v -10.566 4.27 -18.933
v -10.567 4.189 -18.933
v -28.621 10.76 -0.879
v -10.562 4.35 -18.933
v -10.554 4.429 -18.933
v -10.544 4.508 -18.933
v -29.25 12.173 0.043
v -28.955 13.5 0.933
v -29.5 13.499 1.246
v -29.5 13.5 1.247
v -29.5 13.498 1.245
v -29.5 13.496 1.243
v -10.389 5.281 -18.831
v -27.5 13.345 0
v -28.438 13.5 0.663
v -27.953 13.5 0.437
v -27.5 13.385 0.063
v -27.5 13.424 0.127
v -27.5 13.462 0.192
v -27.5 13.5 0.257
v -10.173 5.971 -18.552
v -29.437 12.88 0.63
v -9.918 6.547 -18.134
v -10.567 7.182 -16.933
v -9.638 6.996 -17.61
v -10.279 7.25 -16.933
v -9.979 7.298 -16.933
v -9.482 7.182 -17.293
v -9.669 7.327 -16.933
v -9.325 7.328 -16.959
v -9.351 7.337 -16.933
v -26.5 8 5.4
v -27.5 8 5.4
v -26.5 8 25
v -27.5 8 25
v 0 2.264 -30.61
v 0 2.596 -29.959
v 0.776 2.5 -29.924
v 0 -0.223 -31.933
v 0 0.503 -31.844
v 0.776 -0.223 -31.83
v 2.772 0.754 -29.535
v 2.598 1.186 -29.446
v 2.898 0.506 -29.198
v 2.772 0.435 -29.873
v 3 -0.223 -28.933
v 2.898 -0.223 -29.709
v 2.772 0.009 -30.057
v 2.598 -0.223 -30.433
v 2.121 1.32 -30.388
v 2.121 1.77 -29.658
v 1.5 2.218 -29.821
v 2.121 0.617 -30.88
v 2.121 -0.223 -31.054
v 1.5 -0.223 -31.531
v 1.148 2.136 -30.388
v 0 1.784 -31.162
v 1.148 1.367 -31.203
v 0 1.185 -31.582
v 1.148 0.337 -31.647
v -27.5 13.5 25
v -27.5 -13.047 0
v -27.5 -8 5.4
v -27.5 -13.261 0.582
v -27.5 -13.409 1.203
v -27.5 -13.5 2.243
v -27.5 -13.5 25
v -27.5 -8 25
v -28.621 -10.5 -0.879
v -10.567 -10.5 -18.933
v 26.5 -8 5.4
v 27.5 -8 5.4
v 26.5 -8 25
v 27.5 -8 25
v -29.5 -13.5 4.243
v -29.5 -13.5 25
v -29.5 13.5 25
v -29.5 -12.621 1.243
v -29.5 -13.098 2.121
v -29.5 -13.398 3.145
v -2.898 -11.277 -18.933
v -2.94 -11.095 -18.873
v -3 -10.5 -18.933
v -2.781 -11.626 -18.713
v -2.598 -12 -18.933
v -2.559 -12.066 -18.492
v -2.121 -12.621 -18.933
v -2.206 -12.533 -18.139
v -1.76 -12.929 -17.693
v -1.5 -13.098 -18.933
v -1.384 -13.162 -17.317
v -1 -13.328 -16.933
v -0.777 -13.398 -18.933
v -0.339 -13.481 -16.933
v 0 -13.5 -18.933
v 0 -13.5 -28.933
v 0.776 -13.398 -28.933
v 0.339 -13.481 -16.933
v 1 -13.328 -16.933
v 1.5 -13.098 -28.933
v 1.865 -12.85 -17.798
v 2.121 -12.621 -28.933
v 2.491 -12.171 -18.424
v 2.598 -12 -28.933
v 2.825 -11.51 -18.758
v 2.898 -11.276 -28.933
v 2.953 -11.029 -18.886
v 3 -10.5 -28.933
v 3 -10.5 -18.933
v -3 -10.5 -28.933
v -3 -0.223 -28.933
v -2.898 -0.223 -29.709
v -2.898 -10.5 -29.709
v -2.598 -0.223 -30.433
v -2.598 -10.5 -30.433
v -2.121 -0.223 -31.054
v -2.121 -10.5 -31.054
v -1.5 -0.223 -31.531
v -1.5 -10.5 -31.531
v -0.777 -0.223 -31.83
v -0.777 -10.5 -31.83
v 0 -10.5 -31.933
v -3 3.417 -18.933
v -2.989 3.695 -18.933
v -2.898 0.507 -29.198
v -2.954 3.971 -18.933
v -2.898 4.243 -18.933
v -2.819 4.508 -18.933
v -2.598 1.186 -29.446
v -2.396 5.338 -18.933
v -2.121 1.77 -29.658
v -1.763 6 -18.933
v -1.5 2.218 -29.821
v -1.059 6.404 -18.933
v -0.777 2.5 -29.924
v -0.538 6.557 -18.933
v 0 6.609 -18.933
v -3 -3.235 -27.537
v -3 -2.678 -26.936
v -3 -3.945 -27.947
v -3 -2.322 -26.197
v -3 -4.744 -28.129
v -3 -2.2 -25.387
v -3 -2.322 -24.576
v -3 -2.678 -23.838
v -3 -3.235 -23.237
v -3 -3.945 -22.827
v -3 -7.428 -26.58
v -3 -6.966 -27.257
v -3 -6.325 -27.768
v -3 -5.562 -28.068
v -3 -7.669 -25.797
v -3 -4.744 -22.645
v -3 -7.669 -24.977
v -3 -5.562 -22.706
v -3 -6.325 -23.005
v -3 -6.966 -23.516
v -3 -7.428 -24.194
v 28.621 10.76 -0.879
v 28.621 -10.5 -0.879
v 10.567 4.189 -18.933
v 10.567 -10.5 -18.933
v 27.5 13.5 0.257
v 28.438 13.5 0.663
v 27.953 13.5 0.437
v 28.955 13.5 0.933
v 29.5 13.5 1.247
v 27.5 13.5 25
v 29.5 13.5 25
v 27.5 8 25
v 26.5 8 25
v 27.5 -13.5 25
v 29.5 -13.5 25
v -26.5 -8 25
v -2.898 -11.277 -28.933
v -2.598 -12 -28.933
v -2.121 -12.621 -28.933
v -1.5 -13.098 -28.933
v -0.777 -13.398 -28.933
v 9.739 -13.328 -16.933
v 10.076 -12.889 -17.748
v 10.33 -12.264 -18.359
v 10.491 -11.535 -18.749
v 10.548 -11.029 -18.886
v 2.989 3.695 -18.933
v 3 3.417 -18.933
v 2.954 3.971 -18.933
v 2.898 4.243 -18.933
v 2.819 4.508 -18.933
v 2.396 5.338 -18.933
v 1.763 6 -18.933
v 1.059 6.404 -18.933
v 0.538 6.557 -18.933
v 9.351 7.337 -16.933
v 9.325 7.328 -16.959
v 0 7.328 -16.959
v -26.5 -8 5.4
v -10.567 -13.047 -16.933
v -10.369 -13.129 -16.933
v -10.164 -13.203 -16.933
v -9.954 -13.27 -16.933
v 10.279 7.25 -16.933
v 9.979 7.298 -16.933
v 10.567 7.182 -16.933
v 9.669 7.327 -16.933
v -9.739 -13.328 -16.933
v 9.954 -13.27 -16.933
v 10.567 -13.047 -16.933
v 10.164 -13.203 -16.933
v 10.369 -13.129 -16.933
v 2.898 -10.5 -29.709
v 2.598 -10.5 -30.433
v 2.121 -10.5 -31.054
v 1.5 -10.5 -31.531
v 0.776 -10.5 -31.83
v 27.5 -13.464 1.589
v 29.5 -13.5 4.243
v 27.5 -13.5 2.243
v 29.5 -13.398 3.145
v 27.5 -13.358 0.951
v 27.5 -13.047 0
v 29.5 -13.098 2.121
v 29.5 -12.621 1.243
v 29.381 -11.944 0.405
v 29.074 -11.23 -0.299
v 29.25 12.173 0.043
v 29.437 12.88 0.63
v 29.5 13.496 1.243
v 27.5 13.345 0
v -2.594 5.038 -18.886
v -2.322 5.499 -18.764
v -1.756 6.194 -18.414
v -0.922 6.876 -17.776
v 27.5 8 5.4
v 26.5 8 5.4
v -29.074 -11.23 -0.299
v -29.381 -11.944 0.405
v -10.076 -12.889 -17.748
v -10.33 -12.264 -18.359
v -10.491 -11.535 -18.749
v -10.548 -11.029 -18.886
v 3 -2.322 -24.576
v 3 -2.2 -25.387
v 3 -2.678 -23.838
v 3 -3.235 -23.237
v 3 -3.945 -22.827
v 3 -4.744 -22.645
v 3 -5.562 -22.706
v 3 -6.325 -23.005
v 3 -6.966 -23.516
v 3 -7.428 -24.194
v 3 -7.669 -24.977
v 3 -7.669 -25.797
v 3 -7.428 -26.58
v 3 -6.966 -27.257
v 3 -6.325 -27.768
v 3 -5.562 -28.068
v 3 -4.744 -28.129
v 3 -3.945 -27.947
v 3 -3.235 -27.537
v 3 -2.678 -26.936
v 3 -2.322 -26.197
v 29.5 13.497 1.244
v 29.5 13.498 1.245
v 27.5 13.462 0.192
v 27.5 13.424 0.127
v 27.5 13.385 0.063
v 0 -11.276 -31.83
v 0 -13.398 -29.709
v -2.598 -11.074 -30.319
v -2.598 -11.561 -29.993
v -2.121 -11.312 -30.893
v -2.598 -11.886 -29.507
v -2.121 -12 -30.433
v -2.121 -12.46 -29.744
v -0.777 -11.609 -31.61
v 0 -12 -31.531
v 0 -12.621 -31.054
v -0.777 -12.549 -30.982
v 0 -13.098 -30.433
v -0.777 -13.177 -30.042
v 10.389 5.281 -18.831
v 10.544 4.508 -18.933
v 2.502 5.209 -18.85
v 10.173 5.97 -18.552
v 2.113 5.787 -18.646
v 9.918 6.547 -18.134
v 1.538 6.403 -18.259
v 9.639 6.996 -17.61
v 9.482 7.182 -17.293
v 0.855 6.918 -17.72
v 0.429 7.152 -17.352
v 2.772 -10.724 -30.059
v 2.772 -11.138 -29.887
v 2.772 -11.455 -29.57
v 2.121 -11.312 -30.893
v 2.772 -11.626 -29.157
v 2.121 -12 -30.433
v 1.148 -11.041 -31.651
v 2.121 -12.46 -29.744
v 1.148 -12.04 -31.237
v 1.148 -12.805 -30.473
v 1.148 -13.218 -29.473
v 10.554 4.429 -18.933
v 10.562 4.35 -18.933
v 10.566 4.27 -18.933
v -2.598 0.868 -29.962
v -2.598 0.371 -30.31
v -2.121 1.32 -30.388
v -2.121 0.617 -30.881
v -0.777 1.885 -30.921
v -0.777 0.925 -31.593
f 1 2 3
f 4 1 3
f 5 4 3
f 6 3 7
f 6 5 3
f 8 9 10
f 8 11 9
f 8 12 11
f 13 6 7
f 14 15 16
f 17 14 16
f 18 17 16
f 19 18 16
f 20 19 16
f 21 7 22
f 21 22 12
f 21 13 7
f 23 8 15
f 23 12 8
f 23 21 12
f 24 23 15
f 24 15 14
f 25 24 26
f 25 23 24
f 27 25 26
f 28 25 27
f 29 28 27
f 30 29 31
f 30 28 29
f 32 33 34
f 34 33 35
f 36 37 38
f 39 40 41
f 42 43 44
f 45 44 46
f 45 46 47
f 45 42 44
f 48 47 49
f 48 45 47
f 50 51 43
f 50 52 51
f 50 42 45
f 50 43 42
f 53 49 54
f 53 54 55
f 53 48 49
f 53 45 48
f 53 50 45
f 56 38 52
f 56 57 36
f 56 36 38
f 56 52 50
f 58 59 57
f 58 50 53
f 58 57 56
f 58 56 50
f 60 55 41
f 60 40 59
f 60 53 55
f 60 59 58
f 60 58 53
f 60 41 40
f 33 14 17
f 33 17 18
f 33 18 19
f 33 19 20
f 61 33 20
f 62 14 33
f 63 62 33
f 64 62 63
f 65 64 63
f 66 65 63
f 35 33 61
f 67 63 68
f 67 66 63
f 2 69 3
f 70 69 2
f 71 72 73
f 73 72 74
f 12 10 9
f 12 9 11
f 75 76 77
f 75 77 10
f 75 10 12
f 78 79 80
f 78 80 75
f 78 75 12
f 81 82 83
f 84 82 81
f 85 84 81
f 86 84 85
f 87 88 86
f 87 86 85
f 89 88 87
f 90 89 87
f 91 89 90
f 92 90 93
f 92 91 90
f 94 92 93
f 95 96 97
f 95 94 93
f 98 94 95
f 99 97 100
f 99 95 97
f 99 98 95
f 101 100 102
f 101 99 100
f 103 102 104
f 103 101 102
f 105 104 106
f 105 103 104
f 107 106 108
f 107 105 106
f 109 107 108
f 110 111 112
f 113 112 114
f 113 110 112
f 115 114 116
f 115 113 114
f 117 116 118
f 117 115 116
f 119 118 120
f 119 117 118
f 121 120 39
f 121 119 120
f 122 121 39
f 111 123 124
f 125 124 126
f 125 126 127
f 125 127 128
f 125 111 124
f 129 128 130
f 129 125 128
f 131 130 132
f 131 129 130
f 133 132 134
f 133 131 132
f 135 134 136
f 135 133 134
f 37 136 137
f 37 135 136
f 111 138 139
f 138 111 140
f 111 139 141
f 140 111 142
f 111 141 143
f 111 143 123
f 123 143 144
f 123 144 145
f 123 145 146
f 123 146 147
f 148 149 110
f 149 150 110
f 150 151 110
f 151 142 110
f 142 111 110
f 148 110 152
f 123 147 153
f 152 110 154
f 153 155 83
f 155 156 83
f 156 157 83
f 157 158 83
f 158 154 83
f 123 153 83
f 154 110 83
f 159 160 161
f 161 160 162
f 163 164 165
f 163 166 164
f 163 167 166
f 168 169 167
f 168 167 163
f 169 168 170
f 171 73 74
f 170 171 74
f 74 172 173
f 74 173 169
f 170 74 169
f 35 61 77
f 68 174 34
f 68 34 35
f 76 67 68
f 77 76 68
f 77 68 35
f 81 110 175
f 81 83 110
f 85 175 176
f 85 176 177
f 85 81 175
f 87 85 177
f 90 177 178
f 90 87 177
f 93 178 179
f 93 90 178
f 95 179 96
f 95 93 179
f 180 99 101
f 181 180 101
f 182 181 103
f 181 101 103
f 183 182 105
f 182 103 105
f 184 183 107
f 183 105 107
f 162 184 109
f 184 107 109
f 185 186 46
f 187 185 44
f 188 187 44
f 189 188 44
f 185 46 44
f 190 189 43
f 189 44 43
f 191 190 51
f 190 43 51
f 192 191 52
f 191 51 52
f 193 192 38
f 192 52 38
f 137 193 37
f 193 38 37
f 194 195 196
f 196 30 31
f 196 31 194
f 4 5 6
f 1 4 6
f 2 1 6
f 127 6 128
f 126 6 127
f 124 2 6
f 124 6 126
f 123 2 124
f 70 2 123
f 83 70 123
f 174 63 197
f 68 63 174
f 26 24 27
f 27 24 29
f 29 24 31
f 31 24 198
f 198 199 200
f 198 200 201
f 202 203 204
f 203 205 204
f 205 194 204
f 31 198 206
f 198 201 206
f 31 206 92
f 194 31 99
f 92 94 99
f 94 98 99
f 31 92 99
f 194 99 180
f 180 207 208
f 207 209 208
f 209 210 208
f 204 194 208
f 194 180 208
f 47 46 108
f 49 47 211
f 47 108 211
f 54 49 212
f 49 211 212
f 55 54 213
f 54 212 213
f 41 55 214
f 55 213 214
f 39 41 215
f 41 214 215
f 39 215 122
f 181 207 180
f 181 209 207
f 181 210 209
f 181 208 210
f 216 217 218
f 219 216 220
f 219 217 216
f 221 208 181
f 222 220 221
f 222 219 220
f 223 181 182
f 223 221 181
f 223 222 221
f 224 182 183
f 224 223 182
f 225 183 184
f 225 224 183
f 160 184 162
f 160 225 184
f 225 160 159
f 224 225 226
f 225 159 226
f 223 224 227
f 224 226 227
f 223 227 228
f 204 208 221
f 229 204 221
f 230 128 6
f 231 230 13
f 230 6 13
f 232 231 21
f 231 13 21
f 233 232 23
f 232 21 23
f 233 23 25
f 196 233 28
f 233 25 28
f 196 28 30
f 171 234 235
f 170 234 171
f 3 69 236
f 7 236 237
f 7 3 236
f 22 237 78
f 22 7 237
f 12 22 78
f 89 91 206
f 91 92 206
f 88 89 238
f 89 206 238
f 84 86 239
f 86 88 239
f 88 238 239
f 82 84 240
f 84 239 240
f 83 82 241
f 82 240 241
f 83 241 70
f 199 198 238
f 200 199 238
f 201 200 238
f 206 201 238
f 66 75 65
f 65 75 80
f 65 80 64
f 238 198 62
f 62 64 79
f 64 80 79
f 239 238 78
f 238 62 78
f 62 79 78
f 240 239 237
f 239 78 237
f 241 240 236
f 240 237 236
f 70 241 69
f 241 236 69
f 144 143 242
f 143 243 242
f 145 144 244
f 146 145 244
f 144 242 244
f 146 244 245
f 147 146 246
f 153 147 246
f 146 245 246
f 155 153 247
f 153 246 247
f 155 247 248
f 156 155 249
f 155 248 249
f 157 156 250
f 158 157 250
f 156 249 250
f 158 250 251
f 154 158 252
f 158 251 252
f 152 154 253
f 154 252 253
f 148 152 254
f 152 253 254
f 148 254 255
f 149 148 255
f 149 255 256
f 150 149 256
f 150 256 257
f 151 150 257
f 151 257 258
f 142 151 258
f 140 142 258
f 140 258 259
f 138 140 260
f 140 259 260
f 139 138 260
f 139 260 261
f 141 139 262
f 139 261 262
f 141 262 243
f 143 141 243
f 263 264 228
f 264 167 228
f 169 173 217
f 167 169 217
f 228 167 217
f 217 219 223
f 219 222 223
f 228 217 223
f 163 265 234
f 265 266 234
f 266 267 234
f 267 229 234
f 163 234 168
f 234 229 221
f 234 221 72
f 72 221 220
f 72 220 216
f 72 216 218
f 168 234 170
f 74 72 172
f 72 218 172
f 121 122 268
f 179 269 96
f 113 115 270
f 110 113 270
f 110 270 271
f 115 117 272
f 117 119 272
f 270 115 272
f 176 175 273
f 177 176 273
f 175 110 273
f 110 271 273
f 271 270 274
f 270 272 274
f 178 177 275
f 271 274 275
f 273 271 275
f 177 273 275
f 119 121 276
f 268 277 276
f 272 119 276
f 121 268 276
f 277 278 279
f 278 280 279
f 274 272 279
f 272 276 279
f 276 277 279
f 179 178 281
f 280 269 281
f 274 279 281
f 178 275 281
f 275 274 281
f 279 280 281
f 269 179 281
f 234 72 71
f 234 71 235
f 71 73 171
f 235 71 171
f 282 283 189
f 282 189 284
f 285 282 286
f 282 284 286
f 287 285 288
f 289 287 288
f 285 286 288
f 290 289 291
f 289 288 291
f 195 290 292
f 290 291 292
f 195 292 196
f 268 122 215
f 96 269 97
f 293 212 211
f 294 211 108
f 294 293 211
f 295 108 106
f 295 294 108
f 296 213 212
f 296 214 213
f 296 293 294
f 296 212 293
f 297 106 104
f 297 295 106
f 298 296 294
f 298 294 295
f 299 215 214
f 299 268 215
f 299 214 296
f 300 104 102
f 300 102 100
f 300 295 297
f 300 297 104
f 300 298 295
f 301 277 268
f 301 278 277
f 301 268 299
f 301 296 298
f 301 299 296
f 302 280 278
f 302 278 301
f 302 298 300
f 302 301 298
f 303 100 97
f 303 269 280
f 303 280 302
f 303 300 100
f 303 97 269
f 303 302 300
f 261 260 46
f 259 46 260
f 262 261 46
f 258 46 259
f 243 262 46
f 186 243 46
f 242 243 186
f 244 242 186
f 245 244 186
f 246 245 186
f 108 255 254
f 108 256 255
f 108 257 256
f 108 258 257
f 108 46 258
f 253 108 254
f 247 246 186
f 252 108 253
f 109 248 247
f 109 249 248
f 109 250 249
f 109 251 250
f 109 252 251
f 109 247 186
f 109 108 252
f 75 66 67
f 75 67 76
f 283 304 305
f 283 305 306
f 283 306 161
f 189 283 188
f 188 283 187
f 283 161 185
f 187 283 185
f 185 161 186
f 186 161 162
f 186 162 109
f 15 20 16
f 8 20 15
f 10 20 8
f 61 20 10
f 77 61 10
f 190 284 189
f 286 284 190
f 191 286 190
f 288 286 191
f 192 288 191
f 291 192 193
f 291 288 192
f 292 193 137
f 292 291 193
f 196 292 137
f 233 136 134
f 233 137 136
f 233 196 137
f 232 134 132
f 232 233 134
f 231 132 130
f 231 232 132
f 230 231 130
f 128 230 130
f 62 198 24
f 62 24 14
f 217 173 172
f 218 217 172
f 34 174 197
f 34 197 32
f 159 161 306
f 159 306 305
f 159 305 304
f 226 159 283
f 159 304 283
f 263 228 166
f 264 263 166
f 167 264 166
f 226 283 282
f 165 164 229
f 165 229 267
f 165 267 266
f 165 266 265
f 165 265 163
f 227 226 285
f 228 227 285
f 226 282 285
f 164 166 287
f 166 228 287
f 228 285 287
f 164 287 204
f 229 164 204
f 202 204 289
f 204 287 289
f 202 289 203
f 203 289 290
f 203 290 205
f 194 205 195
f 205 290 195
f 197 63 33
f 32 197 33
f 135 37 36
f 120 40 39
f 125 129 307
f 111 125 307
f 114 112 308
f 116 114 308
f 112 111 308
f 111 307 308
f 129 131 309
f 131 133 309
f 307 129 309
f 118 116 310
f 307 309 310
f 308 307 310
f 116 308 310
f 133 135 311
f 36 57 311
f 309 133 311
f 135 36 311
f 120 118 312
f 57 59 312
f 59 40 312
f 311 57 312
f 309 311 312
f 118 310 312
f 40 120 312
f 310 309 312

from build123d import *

# Parameters (mm, degrees)
F0_W          = 3
F0_H          = 13
F1_DEPTH      = 13.5
F2_W          = 16
F2_H          = 19.6
F3_DEPTH      = 1
F6_DEPTH      = 5000
F7_R          = 2.75
F8_DEPTH      = 50
F9_F1_R       = 3
F9_F2_R       = 3
F9_F3_R       = 3
F9_F4_R       = 2.9999
F10_T1_DEPTH  = 15.0673355609
F10_T3_DEPTH  = 15.0673355609
F10_T5_DEPTH  = 41.7748308216
F10_T7_DEPTH  = 41.7748308216
F10_T9_DEPTH  = 43.4696886285
F10_T11_DEPTH = 12.8188920975
F10_T13_DEPTH = 12.8188920975
F10_T15_DEPTH = 43.4696886285
F10_T17_DEPTH = 33.2132034356
F10_T22_DEPTH = 8.2514565366
F10_S23_R     = 3
F10_T24_DEPTH = 6
F10_T28_DEPTH = 8.2515565366
F10_S29_R     = 3
F10_T30_DEPTH = 6
F10_T34_DEPTH = 10.4999
F10_S35_R     = 3
F10_T36_DEPTH = 7
F10_T40_DEPTH = 10.5
F10_S41_R     = 3
F10_T42_DEPTH = 7


# Not quite as in the source:
# - a fillet or chamfer that OpenCascade refuses, or shapes differently, is made with other operations: its cross-section is extruded or revolved along the edge and cut away or added
# - a fillet or chamfer is up to 0.001 mm smaller than in the source, because OpenCascade refuses the exact size
# - a feature names something its author has since deleted; it is built from what else it names


with BuildPart() as f1:
    # F0 (on Front) → F1 (new body, symmetric)
    with BuildSketch(Plane.XZ):
        with Locations((-1.5, -25.4326644391)):
            Rectangle(F0_W, F0_H)
        Polygon((-10.5673355609, -16.9326644391), (-27.5, 0), (-27.5, 3.3434056677), (-27.5, 25), (-29.5, 25), (-29.5, 0), (-10.5673355609, -18.9326644391), (-3, -18.9326644391), (0, -18.9326644391), (0, -16.9326644391), align=None)
    extrude(amount=F1_DEPTH, both=True)

    # F2 (on face) → F3 (join)
    with BuildSketch(Plane.YZ.offset(-27.5)):
        with Locations((0, 15.2)):
            Rectangle(F2_W, F2_H)
    extrude(amount=F3_DEPTH)

    # F4: F1 across plane


with BuildPart() as f1_1:
    add(f1.part)
    add(f1.part.mirror(Plane.YZ))

    # F5 (on face) → F6 (cut, symmetric)
    with BuildSketch(Plane(origin=(-29.5, 0, 0), x_dir=(0, -1, 0), z_dir=(-1, 0, 0))):
        Polygon((-13.5, 0), (-21.2256871164, 0), (-25.0640398382, -39.3923101205), (-6.5540728933, -39.3923101205), (0.180805733, -37.5877048314), align=None)
    extrude(amount=F6_DEPTH, both=True, mode=Mode.SUBTRACT)

    # F7 (on face) → F8 (cut, symmetric)
    with BuildSketch(Plane.YZ.offset(3)):
        with Locations((-4.9499999732, -25.3868680447)):
            Circle(F7_R)
    extrude(amount=F8_DEPTH, both=True, mode=Mode.SUBTRACT)

    # F9: fillet of radius 3 on 4 edges, made by hand

    # F9_f1
    f9_f1_edges = [f1_1.edges().sort_by_distance(p)[0] for p in [
        (0, 1.8774606434, -31.9326644391),
    ]]
    fillet(f9_f1_edges, radius=F9_F1_R)

    # F9_f2
    f9_f2_edges = [f1_1.edges().sort_by_distance(p)[0] for p in [
        (0, -13.5, -31.9326644391),
    ]]
    fillet(f9_f2_edges, radius=F9_F2_R)

    # F9_f3
    f9_f3_edges = [f1_1.edges().sort_by_distance(p)[0] for p in [
        (3, -5.3615809856, -31.9326644391),
    ]]
    fillet(f9_f3_edges, radius=F9_F3_R)

    # F9_f4 (radius 3 in the source; OpenCascade refuses exactly that, so slightly less here)
    f9_f4_edges = [f1_1.edges().sort_by_distance(p)[0] for p in [
        (-3, -5.3615809856, -31.9326644391),
    ]]
    fillet(f9_f4_edges, radius=F9_F4_R)

    # F10: fillet of radius 3 on 12 edges, made by hand

    # F10_s2 → F10_t1 (cut)
    with BuildSketch(Plane.YZ.offset(3)):
        with BuildLine():
            ThreePointArc((-13.5, -15.9326644391), (-12.6213203436, -18.0539847826), (-10.5, -18.9326644391))
            Line((-10.5, -18.9326644391), (-13.5, -18.9326644391))
            Line((-13.5, -18.9326644391), (-13.5, -15.9326644391))
        make_face()
    extrude(amount=F10_T1_DEPTH, mode=Mode.SUBTRACT)

    # F10_s4 → F10_t3 (cut)
    with BuildSketch(Plane.YZ.offset(-18.0673355609)):
        with BuildLine():
            ThreePointArc((-13.5, -15.9326644391), (-12.6213203436, -18.0539847826), (-10.5, -18.9326644391))
            Line((-10.5, -18.9326644391), (-13.5, -18.9326644391))
            Line((-13.5, -18.9326644391), (-13.5, -15.9326644391))
        make_face()
    extrude(amount=F10_T3_DEPTH, mode=Mode.SUBTRACT)

    # F10_s6 → F10_t5 (cut)
    with BuildSketch(Plane(origin=(-20.0533008589, 0, 20.0533008589), x_dir=(0, 1, 0), z_dir=(0.7071067812, 0, -0.7071067812))):
        with BuildLine():
            ThreePointArc((-13.5, -17.859650045), (-12.6213203436, -19.9809703886), (-10.5, -20.859650045))
            Line((-10.5, -20.859650045), (-13.5, -20.859650045))
            Line((-13.5, -20.859650045), (-13.5, -17.859650045))
        make_face()
    extrude(amount=F10_T5_DEPTH, mode=Mode.SUBTRACT)

    # F10_s8 → F10_t7 (cut)
    with BuildSketch(Plane(origin=(20.0533008589, 0, 20.0533008589), x_dir=(0, 1, 0), z_dir=(-0.7071067812, 0, -0.7071067812))):
        with BuildLine():
            ThreePointArc((-13.5, 17.859650045), (-12.6213203436, 19.9809703886), (-10.5, 20.859650045))
            Line((-10.5, 20.859650045), (-13.5, 20.859650045))
            Line((-13.5, 20.859650045), (-13.5, 17.859650045))
        make_face()
    extrude(amount=F10_T7_DEPTH, mode=Mode.SUBTRACT)

    # F10_s10 → F10_t9 (cut)
    with BuildSketch(Plane(origin=(-6.8077517267, -2.4778189908, -6.8077517267), x_dir=(-0.3420201433, 0.9396926208, 0), z_dir=(0.6847910788, 0.2492435694, 0.6847910788))):
        with BuildLine():
            ThreePointArc((0.3217904404, -21.5780178201), (2.267861443, -21.4075638122), (3.6963913931, -20.0750664959))
            Line((3.6963913931, -20.0750664959), (2.5962561525, -22.1449137726))
            Line((2.5962561525, -22.1449137726), (0.3217904404, -21.5780178201))
        make_face()
    extrude(amount=F10_T9_DEPTH, mode=Mode.SUBTRACT)

    # F10_s12 → F10_t11 (cut)
    with BuildSketch(Plane.YZ.offset(3)):
        with BuildLine():
            ThreePointArc((4.5084510742, -18.9326644391), (6.2291803832, -18.3901205719), (7.3275289366, -16.9587248691))
            Line((7.3275289366, -16.9587248691), (6.6090736888, -18.9326644391))
            Line((6.6090736888, -18.9326644391), (4.5084510742, -18.9326644391))
        make_face()
    extrude(amount=F10_T11_DEPTH, mode=Mode.SUBTRACT)

    # F10_s14 → F10_t13 (cut)
    with BuildSketch(Plane.YZ.offset(-15.8188920975)):
        with BuildLine():
            ThreePointArc((4.5084510742, -18.9326644391), (6.2291803832, -18.3901205719), (7.3275289366, -16.9587248691))
            Line((7.3275289366, -16.9587248691), (6.6090736888, -18.9326644391))
            Line((6.6090736888, -18.9326644391), (4.5084510742, -18.9326644391))
        make_face()
    extrude(amount=F10_T13_DEPTH, mode=Mode.SUBTRACT)

    # F10_s16 → F10_t15 (cut)
    with BuildSketch(Plane(origin=(6.8077517267, -2.4778189908, -6.8077517267), x_dir=(-0.3420201433, -0.9396926208, 0), z_dir=(-0.6847910788, 0.2492435694, 0.6847910788))):
        with BuildLine():
            ThreePointArc((-0.3217904404, -21.5780178201), (-2.267861443, -21.4075638122), (-3.6963913931, -20.0750664959))
            Line((-3.6963913931, -20.0750664959), (-2.5962561525, -22.1449137726))
            Line((-2.5962561525, -22.1449137726), (-0.3217904404, -21.5780178201))
        make_face()
    extrude(amount=F10_T15_DEPTH, mode=Mode.SUBTRACT)

    # F10_s18 → F10_t17 (cut)
    with BuildSketch(Plane.XZ.offset(-16.6066017178)):
        with BuildLine():
            ThreePointArc((28.6213203436, -0.8786796564), (29.2716385975, 0.09459039), (29.5, 1.2426406871))
            Line((29.5, 1.2426406871), (29.5, 0))
            Line((29.5, 0), (28.6213203436, -0.8786796564))
        make_face()
        with BuildLine():
            ThreePointArc((-28.6213203436, -0.8786796564), (-29.2716385975, 0.09459039), (-29.5, 1.2426406871))
            Line((-29.5, 1.2426406871), (-29.5, 0))
            Line((-29.5, 0), (-28.6213203436, -0.8786796564))
        make_face()
    extrude(amount=F10_T17_DEPTH, mode=Mode.SUBTRACT)


with BuildPart() as f10_tool20:
    # F10_s21 → F10_t22 (new body)
    with BuildSketch(Plane.YZ.offset(-3)):
        with BuildLine():
            ThreePointArc((4.5084510742, -18.9326644391), (6.2291803832, -18.3901205719), (7.3275289366, -16.9587248691))
            Line((7.3275289366, -16.9587248691), (6.6090736888, -18.9326644391))
            Line((6.6090736888, -18.9326644391), (4.5084510742, -18.9326644391))
        make_face()
    extrude(amount=F10_T22_DEPTH)

    # F10_s23 → F10_t24 (cut, symmetric)
    with BuildSketch(Plane(origin=(0, -5.0618981212, -13.9074507876), x_dir=(1, 0, 0), z_dir=(0, 0.3420201433, 0.9396926208))):
        with Locations((0, 9.6858503806)):
            Circle(F10_S23_R)
    extrude(amount=F10_T24_DEPTH, both=True, mode=Mode.SUBTRACT)


with BuildPart() as f1_2:
    add(f1_1.part)

    # F10_t19: cut F10_tool20
    add(f10_tool20.part, mode=Mode.SUBTRACT)


with BuildPart() as f10_tool26:
    # F10_s27 → F10_t28 (new body)
    with BuildSketch(Plane.YZ.offset(3)):
        with BuildLine():
            ThreePointArc((4.5084510742, -18.9326644391), (6.2291803832, -18.3901205719), (7.3275289366, -16.9587248691))
            Line((7.3275289366, -16.9587248691), (6.6090736888, -18.9326644391))
            Line((6.6090736888, -18.9326644391), (4.5084510742, -18.9326644391))
        make_face()
    extrude(amount=-F10_T28_DEPTH)

    # F10_s29 → F10_t30 (cut, symmetric)
    with BuildSketch(Plane(origin=(0, -5.0618981212, -13.9074507876), x_dir=(1, 0, 0), z_dir=(0, 0.3420201433, 0.9396926208))):
        with Locations((0, 9.6858503806)):
            Circle(F10_S29_R)
    extrude(amount=F10_T30_DEPTH, both=True, mode=Mode.SUBTRACT)


with BuildPart() as f1_3:
    add(f1_2.part)

    # F10_t25: cut F10_tool26
    add(f10_tool26.part, mode=Mode.SUBTRACT)


with BuildPart() as f10_tool32:
    # F10_s33 → F10_t34 (new body)
    with BuildSketch(Plane.YZ.offset(-3)):
        with BuildLine():
            ThreePointArc((-13.5, -15.9326644391), (-12.6213203436, -18.0539847826), (-10.5, -18.9326644391))
            Line((-10.5, -18.9326644391), (-13.5, -18.9326644391))
            Line((-13.5, -18.9326644391), (-13.5, -15.9326644391))
        make_face()
    extrude(amount=F10_T34_DEPTH)

    # F10_s35 → F10_t36 (cut, symmetric)
    with BuildSketch(Plane.XY.offset(-17.4)):
        with Locations((0, -10.5)):
            Circle(F10_S35_R)
    extrude(amount=F10_T36_DEPTH, both=True, mode=Mode.SUBTRACT)


with BuildPart() as f1_4:
    add(f1_3.part)

    # F10_t31: cut F10_tool32
    add(f10_tool32.part, mode=Mode.SUBTRACT)


with BuildPart() as f10_tool38:
    # F10_s39 → F10_t40 (new body)
    with BuildSketch(Plane.YZ.offset(3)):
        with BuildLine():
            ThreePointArc((-13.5, -15.9326644391), (-12.6213203436, -18.0539847826), (-10.5, -18.9326644391))
            Line((-10.5, -18.9326644391), (-13.5, -18.9326644391))
            Line((-13.5, -18.9326644391), (-13.5, -15.9326644391))
        make_face()
    extrude(amount=-F10_T40_DEPTH)

    # F10_s41 → F10_t42 (cut, symmetric)
    with BuildSketch(Plane.XY.offset(-17.4)):
        with Locations((0, -10.5)):
            Circle(F10_S41_R)
    extrude(amount=F10_T42_DEPTH, both=True, mode=Mode.SUBTRACT)


with BuildPart() as f1_5:
    add(f1_4.part)

    # F10_t37: cut F10_tool38
    add(f10_tool38.part, mode=Mode.SUBTRACT)


solid = f1_5.part
